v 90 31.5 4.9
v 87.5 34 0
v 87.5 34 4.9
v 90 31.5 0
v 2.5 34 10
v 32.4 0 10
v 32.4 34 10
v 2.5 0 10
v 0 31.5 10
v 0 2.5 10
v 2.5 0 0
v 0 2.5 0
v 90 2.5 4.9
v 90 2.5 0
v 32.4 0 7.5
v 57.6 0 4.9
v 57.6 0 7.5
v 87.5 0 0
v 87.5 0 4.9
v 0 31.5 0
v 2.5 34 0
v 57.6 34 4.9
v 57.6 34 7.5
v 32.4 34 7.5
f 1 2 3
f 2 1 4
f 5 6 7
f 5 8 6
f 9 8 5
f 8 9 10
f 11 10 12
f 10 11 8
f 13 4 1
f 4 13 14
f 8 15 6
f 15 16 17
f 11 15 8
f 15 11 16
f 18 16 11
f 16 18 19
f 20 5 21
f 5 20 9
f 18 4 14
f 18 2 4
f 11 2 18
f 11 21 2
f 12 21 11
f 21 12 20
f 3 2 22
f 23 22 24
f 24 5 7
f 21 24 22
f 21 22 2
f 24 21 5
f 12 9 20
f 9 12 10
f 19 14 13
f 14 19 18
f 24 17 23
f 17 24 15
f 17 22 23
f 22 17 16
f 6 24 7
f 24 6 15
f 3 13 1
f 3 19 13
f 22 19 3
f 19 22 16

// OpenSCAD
$fn = 32;

// ----------------------------------------------------------------------
// Stepped bar: twostep, 90 x 34 x 10/4.9 mm
// ----------------------------------------------------------------------

// --- parameters (mm) ---
bar_l = 90;               // bar length, X
bar_w = 34;               // bar width, Y
plate_t = 10;             // thickness of the thick zone, Z
thin_t = 4.9;             // thickness of the thin zone
corner_c = 2.5;           // corner chamfer of the bar
step_cut = 5.1;           // material removed from the thin zone
stair1_x = 32.4;          // position of the first stair
stair2_x = 57.6;          // position of the second stair
mid_t = 7.5;              // thickness of the middle zone
depth_1 = 2.5;            // depth of cut 1 from the top face
depth_2 = 5.1;            // depth of cut 2 from the top face

profile = [[2.5, 0], [87.5, 0], [90, 2.5], [90, 31.5], [87.5, 34], [2.5, 34], [0, 31.5], [0, 2.5]];  // primary outline, 8 points, counter clockwise
void_1 = [[32.4, -1], [57.6, -1], [57.6, 35], [32.4, 35]];  // first stair, 4 points
void_2 = [[57.6, -1], [91, -1], [91, 35], [57.6, 35]];  // second stair, 4 points

// --- the one profile operation ---
difference() {
  linear_extrude(height = plate_t) polygon(points = profile);
  translate([0, 0, plate_t - depth_1])
    linear_extrude(height = depth_1 + 1) polygon(points = void_1);
  translate([0, 0, plate_t - depth_2])
    linear_extrude(height = depth_2 + 1) polygon(points = void_2);
}
